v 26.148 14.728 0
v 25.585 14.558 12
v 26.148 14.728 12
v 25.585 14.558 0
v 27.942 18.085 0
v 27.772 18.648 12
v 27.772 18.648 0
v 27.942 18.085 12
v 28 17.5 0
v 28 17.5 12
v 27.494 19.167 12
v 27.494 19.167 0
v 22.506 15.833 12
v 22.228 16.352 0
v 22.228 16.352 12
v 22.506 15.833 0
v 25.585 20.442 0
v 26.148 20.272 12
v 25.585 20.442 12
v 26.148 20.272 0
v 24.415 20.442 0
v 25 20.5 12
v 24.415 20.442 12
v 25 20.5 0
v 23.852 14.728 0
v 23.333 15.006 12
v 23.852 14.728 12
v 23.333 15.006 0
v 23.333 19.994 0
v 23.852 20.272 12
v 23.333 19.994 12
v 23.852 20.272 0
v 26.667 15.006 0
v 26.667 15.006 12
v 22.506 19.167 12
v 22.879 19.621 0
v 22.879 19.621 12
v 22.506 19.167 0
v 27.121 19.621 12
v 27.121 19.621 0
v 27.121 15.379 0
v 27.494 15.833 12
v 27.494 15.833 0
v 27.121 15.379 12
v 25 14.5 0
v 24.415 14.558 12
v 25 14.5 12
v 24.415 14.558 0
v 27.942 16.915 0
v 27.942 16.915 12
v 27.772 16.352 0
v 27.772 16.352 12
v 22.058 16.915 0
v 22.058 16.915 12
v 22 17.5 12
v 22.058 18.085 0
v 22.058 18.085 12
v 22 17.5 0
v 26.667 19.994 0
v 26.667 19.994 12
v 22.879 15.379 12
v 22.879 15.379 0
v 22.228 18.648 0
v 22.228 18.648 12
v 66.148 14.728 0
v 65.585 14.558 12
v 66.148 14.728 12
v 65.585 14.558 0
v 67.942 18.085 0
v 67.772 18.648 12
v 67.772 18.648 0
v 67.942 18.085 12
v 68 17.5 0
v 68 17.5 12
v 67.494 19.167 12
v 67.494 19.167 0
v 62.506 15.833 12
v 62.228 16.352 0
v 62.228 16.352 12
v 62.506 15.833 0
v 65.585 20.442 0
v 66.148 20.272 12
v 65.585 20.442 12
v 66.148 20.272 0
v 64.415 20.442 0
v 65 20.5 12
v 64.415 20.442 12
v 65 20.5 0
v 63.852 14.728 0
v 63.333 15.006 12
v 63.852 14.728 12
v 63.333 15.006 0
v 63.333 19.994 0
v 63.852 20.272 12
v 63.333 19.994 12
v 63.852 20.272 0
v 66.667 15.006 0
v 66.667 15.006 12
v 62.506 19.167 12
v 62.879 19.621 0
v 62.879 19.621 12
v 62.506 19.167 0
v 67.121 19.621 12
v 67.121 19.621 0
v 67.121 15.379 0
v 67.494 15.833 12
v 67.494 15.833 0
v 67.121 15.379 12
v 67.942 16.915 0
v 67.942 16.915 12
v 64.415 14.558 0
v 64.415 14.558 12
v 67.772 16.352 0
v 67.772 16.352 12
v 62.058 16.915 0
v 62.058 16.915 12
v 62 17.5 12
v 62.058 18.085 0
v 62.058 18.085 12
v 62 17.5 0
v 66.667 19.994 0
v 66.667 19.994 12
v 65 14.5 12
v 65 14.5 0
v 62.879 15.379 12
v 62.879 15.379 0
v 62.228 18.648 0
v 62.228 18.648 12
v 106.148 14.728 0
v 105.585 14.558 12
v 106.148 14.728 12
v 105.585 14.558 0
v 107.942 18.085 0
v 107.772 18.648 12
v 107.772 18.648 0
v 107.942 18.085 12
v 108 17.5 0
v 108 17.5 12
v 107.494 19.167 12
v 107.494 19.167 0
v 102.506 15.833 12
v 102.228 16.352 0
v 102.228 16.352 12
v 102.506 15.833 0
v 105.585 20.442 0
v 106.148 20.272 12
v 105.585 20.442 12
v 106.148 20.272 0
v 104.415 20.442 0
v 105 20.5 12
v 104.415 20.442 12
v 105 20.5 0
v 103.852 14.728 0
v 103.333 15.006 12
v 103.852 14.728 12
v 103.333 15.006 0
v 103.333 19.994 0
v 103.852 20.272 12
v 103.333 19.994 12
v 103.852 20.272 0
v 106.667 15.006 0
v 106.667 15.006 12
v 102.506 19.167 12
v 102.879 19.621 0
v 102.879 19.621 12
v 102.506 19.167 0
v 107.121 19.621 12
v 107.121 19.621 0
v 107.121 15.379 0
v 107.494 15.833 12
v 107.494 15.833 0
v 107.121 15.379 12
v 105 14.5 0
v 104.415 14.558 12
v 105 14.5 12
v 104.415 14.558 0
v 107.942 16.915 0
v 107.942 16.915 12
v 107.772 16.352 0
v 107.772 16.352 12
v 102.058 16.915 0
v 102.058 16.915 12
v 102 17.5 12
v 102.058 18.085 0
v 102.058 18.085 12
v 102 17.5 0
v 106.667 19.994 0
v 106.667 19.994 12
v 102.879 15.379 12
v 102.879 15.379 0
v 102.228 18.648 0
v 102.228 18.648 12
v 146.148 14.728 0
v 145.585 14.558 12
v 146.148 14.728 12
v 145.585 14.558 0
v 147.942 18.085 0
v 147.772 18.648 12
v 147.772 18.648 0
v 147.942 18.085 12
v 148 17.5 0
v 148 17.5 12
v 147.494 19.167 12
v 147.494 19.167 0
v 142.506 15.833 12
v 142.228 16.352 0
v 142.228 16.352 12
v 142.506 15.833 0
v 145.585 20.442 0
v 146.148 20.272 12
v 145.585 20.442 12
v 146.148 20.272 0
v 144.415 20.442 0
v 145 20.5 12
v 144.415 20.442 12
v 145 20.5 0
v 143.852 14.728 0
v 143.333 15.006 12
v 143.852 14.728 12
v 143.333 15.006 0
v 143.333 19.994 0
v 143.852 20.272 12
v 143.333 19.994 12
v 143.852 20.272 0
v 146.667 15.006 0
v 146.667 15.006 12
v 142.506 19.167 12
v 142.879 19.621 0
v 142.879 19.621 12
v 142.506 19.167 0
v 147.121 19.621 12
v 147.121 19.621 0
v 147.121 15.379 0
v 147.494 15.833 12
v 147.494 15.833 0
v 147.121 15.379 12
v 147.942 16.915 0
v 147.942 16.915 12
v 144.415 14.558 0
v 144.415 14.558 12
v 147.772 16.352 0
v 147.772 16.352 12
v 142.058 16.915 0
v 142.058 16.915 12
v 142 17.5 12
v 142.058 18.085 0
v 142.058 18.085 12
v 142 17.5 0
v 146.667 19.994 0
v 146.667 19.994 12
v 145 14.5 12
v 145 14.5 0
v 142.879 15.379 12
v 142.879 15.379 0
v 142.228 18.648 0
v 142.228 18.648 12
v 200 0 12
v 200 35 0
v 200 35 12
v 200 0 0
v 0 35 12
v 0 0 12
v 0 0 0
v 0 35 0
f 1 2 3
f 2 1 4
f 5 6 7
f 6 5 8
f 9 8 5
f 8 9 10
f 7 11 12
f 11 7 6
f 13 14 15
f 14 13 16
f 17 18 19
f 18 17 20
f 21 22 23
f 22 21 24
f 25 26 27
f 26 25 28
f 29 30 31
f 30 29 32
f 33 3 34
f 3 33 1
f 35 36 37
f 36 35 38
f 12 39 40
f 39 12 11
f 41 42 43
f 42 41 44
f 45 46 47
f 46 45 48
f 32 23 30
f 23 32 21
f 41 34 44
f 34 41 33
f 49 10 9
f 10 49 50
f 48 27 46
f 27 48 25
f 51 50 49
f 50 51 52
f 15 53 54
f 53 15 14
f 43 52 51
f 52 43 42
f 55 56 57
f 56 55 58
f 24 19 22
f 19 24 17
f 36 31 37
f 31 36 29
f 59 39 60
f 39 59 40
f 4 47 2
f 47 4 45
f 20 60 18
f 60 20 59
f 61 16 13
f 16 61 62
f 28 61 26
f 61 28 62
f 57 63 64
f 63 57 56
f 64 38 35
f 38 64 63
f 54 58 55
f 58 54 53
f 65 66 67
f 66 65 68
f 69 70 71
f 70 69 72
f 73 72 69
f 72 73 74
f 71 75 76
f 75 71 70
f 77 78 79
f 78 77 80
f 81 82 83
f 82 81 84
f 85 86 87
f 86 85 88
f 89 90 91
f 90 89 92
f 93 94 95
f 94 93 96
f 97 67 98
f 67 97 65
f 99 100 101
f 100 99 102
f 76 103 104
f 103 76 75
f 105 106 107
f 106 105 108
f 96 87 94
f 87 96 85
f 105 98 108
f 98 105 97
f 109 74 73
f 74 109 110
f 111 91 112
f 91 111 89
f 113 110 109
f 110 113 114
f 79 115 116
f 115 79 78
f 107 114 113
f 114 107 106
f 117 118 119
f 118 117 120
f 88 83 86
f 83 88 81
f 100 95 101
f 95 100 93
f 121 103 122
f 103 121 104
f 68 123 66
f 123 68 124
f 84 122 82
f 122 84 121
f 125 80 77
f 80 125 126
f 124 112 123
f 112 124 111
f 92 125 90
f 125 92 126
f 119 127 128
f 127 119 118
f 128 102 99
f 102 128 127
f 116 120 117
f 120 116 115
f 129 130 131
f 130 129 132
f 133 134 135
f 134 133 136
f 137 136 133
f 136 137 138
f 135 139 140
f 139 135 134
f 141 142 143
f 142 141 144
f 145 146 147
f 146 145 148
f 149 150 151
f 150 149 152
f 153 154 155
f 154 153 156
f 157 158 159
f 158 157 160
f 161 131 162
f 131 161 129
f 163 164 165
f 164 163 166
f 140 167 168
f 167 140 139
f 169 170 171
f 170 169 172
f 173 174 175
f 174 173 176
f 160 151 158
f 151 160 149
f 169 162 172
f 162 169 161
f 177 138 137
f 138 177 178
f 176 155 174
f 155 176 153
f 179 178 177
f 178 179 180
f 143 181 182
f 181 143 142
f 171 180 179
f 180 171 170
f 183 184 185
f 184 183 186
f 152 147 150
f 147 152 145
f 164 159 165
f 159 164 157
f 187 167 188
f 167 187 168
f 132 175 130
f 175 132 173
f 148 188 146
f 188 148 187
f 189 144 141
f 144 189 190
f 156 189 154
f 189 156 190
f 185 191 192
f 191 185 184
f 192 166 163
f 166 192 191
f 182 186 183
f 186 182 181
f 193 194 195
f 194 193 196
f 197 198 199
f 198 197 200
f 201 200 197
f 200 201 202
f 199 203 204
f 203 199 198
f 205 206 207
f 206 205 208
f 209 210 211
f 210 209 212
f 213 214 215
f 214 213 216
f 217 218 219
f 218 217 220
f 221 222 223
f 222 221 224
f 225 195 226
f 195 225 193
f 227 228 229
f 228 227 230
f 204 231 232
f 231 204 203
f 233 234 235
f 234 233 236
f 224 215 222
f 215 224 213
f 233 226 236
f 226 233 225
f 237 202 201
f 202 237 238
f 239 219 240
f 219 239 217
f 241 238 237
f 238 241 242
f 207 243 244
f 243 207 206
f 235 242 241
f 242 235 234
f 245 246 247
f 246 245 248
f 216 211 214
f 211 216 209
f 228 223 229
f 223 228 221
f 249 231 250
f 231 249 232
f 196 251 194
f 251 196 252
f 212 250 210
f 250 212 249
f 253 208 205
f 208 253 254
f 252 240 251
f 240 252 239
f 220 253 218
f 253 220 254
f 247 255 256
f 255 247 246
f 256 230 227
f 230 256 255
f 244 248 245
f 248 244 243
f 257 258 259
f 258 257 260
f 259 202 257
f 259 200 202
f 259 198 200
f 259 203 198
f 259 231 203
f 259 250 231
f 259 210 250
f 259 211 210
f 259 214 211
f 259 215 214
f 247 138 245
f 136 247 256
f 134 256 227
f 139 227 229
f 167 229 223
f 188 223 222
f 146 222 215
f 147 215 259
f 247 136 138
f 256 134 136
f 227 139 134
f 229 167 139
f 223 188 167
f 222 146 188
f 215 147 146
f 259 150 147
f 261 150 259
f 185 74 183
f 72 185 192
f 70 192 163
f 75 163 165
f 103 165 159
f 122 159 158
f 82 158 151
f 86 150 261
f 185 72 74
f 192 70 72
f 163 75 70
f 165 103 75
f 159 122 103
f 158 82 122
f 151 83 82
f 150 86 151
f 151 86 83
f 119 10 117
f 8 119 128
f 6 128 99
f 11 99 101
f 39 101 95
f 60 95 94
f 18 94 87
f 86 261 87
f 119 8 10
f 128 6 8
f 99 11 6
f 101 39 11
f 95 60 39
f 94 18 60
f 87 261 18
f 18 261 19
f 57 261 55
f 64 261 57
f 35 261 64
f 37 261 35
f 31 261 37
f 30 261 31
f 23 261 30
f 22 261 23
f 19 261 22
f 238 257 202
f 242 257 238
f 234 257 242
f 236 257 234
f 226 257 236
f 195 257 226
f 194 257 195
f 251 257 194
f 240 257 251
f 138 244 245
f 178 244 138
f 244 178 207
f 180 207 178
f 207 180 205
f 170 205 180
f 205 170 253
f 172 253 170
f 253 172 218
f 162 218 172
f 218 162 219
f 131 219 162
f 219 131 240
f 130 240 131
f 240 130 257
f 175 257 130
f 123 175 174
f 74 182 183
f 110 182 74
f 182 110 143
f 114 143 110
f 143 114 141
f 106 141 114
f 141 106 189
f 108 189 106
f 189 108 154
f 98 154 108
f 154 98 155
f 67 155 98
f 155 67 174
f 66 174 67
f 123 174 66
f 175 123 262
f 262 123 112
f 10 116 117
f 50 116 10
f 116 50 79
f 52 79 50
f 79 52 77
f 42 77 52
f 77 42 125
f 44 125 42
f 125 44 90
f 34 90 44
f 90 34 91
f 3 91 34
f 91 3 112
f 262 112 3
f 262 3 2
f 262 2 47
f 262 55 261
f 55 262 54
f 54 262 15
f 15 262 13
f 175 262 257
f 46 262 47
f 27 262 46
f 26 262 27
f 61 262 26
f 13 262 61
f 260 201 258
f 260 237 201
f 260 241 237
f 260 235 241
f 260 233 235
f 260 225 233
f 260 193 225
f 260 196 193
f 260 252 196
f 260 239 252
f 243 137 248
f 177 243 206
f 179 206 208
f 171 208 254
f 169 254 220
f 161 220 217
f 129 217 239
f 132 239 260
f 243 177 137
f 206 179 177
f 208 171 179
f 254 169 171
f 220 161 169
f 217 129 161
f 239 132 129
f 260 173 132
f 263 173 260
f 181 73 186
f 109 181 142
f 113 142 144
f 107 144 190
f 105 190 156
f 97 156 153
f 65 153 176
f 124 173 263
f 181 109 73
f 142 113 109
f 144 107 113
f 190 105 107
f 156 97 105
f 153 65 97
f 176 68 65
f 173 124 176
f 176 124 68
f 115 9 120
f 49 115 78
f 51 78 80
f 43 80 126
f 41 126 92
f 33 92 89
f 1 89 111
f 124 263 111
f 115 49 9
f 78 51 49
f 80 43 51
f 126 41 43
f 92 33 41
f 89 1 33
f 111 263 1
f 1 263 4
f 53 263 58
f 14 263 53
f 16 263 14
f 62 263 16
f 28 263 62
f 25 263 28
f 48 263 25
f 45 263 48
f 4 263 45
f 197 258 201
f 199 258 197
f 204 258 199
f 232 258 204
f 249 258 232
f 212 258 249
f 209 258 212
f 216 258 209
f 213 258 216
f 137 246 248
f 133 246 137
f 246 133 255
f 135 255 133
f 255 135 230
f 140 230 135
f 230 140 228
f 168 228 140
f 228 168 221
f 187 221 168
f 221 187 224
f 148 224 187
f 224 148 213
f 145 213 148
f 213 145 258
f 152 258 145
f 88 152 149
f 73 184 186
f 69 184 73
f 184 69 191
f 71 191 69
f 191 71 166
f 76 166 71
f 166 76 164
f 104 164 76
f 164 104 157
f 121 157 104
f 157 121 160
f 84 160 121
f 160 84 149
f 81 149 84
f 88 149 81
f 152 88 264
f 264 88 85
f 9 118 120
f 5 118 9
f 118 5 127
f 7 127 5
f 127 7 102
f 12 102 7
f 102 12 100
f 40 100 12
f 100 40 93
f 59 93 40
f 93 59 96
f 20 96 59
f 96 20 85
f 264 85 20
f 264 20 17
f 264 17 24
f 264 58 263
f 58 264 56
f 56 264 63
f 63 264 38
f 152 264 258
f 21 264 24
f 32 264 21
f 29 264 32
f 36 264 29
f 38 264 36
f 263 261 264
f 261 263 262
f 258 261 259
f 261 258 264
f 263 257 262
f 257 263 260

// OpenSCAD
$fn = 32;

// ----------------------------------------------------------------------
// Long rail: 200-250 mm mounting rail
// ----------------------------------------------------------------------

// --- parameters (mm) ---
rail_l = 200;             // rail length, X
rail_w = 35;              // rail width, Y
rail_t = 12;              // rail thickness, Z
hole_d = 6;               // mounting hole diameter
hole_start = 25;          // first hole offset from the end
hole_pitch = 40;          // hole pitch
holes = 4;                // number of holes

difference() {
  cube([rail_l, rail_w, rail_t]);
  for (i = [0 : holes - 1])
    translate([hole_start + i * hole_pitch, rail_w / 2, -1])
      cylinder(h = rail_t + 2, d = hole_d);
}
